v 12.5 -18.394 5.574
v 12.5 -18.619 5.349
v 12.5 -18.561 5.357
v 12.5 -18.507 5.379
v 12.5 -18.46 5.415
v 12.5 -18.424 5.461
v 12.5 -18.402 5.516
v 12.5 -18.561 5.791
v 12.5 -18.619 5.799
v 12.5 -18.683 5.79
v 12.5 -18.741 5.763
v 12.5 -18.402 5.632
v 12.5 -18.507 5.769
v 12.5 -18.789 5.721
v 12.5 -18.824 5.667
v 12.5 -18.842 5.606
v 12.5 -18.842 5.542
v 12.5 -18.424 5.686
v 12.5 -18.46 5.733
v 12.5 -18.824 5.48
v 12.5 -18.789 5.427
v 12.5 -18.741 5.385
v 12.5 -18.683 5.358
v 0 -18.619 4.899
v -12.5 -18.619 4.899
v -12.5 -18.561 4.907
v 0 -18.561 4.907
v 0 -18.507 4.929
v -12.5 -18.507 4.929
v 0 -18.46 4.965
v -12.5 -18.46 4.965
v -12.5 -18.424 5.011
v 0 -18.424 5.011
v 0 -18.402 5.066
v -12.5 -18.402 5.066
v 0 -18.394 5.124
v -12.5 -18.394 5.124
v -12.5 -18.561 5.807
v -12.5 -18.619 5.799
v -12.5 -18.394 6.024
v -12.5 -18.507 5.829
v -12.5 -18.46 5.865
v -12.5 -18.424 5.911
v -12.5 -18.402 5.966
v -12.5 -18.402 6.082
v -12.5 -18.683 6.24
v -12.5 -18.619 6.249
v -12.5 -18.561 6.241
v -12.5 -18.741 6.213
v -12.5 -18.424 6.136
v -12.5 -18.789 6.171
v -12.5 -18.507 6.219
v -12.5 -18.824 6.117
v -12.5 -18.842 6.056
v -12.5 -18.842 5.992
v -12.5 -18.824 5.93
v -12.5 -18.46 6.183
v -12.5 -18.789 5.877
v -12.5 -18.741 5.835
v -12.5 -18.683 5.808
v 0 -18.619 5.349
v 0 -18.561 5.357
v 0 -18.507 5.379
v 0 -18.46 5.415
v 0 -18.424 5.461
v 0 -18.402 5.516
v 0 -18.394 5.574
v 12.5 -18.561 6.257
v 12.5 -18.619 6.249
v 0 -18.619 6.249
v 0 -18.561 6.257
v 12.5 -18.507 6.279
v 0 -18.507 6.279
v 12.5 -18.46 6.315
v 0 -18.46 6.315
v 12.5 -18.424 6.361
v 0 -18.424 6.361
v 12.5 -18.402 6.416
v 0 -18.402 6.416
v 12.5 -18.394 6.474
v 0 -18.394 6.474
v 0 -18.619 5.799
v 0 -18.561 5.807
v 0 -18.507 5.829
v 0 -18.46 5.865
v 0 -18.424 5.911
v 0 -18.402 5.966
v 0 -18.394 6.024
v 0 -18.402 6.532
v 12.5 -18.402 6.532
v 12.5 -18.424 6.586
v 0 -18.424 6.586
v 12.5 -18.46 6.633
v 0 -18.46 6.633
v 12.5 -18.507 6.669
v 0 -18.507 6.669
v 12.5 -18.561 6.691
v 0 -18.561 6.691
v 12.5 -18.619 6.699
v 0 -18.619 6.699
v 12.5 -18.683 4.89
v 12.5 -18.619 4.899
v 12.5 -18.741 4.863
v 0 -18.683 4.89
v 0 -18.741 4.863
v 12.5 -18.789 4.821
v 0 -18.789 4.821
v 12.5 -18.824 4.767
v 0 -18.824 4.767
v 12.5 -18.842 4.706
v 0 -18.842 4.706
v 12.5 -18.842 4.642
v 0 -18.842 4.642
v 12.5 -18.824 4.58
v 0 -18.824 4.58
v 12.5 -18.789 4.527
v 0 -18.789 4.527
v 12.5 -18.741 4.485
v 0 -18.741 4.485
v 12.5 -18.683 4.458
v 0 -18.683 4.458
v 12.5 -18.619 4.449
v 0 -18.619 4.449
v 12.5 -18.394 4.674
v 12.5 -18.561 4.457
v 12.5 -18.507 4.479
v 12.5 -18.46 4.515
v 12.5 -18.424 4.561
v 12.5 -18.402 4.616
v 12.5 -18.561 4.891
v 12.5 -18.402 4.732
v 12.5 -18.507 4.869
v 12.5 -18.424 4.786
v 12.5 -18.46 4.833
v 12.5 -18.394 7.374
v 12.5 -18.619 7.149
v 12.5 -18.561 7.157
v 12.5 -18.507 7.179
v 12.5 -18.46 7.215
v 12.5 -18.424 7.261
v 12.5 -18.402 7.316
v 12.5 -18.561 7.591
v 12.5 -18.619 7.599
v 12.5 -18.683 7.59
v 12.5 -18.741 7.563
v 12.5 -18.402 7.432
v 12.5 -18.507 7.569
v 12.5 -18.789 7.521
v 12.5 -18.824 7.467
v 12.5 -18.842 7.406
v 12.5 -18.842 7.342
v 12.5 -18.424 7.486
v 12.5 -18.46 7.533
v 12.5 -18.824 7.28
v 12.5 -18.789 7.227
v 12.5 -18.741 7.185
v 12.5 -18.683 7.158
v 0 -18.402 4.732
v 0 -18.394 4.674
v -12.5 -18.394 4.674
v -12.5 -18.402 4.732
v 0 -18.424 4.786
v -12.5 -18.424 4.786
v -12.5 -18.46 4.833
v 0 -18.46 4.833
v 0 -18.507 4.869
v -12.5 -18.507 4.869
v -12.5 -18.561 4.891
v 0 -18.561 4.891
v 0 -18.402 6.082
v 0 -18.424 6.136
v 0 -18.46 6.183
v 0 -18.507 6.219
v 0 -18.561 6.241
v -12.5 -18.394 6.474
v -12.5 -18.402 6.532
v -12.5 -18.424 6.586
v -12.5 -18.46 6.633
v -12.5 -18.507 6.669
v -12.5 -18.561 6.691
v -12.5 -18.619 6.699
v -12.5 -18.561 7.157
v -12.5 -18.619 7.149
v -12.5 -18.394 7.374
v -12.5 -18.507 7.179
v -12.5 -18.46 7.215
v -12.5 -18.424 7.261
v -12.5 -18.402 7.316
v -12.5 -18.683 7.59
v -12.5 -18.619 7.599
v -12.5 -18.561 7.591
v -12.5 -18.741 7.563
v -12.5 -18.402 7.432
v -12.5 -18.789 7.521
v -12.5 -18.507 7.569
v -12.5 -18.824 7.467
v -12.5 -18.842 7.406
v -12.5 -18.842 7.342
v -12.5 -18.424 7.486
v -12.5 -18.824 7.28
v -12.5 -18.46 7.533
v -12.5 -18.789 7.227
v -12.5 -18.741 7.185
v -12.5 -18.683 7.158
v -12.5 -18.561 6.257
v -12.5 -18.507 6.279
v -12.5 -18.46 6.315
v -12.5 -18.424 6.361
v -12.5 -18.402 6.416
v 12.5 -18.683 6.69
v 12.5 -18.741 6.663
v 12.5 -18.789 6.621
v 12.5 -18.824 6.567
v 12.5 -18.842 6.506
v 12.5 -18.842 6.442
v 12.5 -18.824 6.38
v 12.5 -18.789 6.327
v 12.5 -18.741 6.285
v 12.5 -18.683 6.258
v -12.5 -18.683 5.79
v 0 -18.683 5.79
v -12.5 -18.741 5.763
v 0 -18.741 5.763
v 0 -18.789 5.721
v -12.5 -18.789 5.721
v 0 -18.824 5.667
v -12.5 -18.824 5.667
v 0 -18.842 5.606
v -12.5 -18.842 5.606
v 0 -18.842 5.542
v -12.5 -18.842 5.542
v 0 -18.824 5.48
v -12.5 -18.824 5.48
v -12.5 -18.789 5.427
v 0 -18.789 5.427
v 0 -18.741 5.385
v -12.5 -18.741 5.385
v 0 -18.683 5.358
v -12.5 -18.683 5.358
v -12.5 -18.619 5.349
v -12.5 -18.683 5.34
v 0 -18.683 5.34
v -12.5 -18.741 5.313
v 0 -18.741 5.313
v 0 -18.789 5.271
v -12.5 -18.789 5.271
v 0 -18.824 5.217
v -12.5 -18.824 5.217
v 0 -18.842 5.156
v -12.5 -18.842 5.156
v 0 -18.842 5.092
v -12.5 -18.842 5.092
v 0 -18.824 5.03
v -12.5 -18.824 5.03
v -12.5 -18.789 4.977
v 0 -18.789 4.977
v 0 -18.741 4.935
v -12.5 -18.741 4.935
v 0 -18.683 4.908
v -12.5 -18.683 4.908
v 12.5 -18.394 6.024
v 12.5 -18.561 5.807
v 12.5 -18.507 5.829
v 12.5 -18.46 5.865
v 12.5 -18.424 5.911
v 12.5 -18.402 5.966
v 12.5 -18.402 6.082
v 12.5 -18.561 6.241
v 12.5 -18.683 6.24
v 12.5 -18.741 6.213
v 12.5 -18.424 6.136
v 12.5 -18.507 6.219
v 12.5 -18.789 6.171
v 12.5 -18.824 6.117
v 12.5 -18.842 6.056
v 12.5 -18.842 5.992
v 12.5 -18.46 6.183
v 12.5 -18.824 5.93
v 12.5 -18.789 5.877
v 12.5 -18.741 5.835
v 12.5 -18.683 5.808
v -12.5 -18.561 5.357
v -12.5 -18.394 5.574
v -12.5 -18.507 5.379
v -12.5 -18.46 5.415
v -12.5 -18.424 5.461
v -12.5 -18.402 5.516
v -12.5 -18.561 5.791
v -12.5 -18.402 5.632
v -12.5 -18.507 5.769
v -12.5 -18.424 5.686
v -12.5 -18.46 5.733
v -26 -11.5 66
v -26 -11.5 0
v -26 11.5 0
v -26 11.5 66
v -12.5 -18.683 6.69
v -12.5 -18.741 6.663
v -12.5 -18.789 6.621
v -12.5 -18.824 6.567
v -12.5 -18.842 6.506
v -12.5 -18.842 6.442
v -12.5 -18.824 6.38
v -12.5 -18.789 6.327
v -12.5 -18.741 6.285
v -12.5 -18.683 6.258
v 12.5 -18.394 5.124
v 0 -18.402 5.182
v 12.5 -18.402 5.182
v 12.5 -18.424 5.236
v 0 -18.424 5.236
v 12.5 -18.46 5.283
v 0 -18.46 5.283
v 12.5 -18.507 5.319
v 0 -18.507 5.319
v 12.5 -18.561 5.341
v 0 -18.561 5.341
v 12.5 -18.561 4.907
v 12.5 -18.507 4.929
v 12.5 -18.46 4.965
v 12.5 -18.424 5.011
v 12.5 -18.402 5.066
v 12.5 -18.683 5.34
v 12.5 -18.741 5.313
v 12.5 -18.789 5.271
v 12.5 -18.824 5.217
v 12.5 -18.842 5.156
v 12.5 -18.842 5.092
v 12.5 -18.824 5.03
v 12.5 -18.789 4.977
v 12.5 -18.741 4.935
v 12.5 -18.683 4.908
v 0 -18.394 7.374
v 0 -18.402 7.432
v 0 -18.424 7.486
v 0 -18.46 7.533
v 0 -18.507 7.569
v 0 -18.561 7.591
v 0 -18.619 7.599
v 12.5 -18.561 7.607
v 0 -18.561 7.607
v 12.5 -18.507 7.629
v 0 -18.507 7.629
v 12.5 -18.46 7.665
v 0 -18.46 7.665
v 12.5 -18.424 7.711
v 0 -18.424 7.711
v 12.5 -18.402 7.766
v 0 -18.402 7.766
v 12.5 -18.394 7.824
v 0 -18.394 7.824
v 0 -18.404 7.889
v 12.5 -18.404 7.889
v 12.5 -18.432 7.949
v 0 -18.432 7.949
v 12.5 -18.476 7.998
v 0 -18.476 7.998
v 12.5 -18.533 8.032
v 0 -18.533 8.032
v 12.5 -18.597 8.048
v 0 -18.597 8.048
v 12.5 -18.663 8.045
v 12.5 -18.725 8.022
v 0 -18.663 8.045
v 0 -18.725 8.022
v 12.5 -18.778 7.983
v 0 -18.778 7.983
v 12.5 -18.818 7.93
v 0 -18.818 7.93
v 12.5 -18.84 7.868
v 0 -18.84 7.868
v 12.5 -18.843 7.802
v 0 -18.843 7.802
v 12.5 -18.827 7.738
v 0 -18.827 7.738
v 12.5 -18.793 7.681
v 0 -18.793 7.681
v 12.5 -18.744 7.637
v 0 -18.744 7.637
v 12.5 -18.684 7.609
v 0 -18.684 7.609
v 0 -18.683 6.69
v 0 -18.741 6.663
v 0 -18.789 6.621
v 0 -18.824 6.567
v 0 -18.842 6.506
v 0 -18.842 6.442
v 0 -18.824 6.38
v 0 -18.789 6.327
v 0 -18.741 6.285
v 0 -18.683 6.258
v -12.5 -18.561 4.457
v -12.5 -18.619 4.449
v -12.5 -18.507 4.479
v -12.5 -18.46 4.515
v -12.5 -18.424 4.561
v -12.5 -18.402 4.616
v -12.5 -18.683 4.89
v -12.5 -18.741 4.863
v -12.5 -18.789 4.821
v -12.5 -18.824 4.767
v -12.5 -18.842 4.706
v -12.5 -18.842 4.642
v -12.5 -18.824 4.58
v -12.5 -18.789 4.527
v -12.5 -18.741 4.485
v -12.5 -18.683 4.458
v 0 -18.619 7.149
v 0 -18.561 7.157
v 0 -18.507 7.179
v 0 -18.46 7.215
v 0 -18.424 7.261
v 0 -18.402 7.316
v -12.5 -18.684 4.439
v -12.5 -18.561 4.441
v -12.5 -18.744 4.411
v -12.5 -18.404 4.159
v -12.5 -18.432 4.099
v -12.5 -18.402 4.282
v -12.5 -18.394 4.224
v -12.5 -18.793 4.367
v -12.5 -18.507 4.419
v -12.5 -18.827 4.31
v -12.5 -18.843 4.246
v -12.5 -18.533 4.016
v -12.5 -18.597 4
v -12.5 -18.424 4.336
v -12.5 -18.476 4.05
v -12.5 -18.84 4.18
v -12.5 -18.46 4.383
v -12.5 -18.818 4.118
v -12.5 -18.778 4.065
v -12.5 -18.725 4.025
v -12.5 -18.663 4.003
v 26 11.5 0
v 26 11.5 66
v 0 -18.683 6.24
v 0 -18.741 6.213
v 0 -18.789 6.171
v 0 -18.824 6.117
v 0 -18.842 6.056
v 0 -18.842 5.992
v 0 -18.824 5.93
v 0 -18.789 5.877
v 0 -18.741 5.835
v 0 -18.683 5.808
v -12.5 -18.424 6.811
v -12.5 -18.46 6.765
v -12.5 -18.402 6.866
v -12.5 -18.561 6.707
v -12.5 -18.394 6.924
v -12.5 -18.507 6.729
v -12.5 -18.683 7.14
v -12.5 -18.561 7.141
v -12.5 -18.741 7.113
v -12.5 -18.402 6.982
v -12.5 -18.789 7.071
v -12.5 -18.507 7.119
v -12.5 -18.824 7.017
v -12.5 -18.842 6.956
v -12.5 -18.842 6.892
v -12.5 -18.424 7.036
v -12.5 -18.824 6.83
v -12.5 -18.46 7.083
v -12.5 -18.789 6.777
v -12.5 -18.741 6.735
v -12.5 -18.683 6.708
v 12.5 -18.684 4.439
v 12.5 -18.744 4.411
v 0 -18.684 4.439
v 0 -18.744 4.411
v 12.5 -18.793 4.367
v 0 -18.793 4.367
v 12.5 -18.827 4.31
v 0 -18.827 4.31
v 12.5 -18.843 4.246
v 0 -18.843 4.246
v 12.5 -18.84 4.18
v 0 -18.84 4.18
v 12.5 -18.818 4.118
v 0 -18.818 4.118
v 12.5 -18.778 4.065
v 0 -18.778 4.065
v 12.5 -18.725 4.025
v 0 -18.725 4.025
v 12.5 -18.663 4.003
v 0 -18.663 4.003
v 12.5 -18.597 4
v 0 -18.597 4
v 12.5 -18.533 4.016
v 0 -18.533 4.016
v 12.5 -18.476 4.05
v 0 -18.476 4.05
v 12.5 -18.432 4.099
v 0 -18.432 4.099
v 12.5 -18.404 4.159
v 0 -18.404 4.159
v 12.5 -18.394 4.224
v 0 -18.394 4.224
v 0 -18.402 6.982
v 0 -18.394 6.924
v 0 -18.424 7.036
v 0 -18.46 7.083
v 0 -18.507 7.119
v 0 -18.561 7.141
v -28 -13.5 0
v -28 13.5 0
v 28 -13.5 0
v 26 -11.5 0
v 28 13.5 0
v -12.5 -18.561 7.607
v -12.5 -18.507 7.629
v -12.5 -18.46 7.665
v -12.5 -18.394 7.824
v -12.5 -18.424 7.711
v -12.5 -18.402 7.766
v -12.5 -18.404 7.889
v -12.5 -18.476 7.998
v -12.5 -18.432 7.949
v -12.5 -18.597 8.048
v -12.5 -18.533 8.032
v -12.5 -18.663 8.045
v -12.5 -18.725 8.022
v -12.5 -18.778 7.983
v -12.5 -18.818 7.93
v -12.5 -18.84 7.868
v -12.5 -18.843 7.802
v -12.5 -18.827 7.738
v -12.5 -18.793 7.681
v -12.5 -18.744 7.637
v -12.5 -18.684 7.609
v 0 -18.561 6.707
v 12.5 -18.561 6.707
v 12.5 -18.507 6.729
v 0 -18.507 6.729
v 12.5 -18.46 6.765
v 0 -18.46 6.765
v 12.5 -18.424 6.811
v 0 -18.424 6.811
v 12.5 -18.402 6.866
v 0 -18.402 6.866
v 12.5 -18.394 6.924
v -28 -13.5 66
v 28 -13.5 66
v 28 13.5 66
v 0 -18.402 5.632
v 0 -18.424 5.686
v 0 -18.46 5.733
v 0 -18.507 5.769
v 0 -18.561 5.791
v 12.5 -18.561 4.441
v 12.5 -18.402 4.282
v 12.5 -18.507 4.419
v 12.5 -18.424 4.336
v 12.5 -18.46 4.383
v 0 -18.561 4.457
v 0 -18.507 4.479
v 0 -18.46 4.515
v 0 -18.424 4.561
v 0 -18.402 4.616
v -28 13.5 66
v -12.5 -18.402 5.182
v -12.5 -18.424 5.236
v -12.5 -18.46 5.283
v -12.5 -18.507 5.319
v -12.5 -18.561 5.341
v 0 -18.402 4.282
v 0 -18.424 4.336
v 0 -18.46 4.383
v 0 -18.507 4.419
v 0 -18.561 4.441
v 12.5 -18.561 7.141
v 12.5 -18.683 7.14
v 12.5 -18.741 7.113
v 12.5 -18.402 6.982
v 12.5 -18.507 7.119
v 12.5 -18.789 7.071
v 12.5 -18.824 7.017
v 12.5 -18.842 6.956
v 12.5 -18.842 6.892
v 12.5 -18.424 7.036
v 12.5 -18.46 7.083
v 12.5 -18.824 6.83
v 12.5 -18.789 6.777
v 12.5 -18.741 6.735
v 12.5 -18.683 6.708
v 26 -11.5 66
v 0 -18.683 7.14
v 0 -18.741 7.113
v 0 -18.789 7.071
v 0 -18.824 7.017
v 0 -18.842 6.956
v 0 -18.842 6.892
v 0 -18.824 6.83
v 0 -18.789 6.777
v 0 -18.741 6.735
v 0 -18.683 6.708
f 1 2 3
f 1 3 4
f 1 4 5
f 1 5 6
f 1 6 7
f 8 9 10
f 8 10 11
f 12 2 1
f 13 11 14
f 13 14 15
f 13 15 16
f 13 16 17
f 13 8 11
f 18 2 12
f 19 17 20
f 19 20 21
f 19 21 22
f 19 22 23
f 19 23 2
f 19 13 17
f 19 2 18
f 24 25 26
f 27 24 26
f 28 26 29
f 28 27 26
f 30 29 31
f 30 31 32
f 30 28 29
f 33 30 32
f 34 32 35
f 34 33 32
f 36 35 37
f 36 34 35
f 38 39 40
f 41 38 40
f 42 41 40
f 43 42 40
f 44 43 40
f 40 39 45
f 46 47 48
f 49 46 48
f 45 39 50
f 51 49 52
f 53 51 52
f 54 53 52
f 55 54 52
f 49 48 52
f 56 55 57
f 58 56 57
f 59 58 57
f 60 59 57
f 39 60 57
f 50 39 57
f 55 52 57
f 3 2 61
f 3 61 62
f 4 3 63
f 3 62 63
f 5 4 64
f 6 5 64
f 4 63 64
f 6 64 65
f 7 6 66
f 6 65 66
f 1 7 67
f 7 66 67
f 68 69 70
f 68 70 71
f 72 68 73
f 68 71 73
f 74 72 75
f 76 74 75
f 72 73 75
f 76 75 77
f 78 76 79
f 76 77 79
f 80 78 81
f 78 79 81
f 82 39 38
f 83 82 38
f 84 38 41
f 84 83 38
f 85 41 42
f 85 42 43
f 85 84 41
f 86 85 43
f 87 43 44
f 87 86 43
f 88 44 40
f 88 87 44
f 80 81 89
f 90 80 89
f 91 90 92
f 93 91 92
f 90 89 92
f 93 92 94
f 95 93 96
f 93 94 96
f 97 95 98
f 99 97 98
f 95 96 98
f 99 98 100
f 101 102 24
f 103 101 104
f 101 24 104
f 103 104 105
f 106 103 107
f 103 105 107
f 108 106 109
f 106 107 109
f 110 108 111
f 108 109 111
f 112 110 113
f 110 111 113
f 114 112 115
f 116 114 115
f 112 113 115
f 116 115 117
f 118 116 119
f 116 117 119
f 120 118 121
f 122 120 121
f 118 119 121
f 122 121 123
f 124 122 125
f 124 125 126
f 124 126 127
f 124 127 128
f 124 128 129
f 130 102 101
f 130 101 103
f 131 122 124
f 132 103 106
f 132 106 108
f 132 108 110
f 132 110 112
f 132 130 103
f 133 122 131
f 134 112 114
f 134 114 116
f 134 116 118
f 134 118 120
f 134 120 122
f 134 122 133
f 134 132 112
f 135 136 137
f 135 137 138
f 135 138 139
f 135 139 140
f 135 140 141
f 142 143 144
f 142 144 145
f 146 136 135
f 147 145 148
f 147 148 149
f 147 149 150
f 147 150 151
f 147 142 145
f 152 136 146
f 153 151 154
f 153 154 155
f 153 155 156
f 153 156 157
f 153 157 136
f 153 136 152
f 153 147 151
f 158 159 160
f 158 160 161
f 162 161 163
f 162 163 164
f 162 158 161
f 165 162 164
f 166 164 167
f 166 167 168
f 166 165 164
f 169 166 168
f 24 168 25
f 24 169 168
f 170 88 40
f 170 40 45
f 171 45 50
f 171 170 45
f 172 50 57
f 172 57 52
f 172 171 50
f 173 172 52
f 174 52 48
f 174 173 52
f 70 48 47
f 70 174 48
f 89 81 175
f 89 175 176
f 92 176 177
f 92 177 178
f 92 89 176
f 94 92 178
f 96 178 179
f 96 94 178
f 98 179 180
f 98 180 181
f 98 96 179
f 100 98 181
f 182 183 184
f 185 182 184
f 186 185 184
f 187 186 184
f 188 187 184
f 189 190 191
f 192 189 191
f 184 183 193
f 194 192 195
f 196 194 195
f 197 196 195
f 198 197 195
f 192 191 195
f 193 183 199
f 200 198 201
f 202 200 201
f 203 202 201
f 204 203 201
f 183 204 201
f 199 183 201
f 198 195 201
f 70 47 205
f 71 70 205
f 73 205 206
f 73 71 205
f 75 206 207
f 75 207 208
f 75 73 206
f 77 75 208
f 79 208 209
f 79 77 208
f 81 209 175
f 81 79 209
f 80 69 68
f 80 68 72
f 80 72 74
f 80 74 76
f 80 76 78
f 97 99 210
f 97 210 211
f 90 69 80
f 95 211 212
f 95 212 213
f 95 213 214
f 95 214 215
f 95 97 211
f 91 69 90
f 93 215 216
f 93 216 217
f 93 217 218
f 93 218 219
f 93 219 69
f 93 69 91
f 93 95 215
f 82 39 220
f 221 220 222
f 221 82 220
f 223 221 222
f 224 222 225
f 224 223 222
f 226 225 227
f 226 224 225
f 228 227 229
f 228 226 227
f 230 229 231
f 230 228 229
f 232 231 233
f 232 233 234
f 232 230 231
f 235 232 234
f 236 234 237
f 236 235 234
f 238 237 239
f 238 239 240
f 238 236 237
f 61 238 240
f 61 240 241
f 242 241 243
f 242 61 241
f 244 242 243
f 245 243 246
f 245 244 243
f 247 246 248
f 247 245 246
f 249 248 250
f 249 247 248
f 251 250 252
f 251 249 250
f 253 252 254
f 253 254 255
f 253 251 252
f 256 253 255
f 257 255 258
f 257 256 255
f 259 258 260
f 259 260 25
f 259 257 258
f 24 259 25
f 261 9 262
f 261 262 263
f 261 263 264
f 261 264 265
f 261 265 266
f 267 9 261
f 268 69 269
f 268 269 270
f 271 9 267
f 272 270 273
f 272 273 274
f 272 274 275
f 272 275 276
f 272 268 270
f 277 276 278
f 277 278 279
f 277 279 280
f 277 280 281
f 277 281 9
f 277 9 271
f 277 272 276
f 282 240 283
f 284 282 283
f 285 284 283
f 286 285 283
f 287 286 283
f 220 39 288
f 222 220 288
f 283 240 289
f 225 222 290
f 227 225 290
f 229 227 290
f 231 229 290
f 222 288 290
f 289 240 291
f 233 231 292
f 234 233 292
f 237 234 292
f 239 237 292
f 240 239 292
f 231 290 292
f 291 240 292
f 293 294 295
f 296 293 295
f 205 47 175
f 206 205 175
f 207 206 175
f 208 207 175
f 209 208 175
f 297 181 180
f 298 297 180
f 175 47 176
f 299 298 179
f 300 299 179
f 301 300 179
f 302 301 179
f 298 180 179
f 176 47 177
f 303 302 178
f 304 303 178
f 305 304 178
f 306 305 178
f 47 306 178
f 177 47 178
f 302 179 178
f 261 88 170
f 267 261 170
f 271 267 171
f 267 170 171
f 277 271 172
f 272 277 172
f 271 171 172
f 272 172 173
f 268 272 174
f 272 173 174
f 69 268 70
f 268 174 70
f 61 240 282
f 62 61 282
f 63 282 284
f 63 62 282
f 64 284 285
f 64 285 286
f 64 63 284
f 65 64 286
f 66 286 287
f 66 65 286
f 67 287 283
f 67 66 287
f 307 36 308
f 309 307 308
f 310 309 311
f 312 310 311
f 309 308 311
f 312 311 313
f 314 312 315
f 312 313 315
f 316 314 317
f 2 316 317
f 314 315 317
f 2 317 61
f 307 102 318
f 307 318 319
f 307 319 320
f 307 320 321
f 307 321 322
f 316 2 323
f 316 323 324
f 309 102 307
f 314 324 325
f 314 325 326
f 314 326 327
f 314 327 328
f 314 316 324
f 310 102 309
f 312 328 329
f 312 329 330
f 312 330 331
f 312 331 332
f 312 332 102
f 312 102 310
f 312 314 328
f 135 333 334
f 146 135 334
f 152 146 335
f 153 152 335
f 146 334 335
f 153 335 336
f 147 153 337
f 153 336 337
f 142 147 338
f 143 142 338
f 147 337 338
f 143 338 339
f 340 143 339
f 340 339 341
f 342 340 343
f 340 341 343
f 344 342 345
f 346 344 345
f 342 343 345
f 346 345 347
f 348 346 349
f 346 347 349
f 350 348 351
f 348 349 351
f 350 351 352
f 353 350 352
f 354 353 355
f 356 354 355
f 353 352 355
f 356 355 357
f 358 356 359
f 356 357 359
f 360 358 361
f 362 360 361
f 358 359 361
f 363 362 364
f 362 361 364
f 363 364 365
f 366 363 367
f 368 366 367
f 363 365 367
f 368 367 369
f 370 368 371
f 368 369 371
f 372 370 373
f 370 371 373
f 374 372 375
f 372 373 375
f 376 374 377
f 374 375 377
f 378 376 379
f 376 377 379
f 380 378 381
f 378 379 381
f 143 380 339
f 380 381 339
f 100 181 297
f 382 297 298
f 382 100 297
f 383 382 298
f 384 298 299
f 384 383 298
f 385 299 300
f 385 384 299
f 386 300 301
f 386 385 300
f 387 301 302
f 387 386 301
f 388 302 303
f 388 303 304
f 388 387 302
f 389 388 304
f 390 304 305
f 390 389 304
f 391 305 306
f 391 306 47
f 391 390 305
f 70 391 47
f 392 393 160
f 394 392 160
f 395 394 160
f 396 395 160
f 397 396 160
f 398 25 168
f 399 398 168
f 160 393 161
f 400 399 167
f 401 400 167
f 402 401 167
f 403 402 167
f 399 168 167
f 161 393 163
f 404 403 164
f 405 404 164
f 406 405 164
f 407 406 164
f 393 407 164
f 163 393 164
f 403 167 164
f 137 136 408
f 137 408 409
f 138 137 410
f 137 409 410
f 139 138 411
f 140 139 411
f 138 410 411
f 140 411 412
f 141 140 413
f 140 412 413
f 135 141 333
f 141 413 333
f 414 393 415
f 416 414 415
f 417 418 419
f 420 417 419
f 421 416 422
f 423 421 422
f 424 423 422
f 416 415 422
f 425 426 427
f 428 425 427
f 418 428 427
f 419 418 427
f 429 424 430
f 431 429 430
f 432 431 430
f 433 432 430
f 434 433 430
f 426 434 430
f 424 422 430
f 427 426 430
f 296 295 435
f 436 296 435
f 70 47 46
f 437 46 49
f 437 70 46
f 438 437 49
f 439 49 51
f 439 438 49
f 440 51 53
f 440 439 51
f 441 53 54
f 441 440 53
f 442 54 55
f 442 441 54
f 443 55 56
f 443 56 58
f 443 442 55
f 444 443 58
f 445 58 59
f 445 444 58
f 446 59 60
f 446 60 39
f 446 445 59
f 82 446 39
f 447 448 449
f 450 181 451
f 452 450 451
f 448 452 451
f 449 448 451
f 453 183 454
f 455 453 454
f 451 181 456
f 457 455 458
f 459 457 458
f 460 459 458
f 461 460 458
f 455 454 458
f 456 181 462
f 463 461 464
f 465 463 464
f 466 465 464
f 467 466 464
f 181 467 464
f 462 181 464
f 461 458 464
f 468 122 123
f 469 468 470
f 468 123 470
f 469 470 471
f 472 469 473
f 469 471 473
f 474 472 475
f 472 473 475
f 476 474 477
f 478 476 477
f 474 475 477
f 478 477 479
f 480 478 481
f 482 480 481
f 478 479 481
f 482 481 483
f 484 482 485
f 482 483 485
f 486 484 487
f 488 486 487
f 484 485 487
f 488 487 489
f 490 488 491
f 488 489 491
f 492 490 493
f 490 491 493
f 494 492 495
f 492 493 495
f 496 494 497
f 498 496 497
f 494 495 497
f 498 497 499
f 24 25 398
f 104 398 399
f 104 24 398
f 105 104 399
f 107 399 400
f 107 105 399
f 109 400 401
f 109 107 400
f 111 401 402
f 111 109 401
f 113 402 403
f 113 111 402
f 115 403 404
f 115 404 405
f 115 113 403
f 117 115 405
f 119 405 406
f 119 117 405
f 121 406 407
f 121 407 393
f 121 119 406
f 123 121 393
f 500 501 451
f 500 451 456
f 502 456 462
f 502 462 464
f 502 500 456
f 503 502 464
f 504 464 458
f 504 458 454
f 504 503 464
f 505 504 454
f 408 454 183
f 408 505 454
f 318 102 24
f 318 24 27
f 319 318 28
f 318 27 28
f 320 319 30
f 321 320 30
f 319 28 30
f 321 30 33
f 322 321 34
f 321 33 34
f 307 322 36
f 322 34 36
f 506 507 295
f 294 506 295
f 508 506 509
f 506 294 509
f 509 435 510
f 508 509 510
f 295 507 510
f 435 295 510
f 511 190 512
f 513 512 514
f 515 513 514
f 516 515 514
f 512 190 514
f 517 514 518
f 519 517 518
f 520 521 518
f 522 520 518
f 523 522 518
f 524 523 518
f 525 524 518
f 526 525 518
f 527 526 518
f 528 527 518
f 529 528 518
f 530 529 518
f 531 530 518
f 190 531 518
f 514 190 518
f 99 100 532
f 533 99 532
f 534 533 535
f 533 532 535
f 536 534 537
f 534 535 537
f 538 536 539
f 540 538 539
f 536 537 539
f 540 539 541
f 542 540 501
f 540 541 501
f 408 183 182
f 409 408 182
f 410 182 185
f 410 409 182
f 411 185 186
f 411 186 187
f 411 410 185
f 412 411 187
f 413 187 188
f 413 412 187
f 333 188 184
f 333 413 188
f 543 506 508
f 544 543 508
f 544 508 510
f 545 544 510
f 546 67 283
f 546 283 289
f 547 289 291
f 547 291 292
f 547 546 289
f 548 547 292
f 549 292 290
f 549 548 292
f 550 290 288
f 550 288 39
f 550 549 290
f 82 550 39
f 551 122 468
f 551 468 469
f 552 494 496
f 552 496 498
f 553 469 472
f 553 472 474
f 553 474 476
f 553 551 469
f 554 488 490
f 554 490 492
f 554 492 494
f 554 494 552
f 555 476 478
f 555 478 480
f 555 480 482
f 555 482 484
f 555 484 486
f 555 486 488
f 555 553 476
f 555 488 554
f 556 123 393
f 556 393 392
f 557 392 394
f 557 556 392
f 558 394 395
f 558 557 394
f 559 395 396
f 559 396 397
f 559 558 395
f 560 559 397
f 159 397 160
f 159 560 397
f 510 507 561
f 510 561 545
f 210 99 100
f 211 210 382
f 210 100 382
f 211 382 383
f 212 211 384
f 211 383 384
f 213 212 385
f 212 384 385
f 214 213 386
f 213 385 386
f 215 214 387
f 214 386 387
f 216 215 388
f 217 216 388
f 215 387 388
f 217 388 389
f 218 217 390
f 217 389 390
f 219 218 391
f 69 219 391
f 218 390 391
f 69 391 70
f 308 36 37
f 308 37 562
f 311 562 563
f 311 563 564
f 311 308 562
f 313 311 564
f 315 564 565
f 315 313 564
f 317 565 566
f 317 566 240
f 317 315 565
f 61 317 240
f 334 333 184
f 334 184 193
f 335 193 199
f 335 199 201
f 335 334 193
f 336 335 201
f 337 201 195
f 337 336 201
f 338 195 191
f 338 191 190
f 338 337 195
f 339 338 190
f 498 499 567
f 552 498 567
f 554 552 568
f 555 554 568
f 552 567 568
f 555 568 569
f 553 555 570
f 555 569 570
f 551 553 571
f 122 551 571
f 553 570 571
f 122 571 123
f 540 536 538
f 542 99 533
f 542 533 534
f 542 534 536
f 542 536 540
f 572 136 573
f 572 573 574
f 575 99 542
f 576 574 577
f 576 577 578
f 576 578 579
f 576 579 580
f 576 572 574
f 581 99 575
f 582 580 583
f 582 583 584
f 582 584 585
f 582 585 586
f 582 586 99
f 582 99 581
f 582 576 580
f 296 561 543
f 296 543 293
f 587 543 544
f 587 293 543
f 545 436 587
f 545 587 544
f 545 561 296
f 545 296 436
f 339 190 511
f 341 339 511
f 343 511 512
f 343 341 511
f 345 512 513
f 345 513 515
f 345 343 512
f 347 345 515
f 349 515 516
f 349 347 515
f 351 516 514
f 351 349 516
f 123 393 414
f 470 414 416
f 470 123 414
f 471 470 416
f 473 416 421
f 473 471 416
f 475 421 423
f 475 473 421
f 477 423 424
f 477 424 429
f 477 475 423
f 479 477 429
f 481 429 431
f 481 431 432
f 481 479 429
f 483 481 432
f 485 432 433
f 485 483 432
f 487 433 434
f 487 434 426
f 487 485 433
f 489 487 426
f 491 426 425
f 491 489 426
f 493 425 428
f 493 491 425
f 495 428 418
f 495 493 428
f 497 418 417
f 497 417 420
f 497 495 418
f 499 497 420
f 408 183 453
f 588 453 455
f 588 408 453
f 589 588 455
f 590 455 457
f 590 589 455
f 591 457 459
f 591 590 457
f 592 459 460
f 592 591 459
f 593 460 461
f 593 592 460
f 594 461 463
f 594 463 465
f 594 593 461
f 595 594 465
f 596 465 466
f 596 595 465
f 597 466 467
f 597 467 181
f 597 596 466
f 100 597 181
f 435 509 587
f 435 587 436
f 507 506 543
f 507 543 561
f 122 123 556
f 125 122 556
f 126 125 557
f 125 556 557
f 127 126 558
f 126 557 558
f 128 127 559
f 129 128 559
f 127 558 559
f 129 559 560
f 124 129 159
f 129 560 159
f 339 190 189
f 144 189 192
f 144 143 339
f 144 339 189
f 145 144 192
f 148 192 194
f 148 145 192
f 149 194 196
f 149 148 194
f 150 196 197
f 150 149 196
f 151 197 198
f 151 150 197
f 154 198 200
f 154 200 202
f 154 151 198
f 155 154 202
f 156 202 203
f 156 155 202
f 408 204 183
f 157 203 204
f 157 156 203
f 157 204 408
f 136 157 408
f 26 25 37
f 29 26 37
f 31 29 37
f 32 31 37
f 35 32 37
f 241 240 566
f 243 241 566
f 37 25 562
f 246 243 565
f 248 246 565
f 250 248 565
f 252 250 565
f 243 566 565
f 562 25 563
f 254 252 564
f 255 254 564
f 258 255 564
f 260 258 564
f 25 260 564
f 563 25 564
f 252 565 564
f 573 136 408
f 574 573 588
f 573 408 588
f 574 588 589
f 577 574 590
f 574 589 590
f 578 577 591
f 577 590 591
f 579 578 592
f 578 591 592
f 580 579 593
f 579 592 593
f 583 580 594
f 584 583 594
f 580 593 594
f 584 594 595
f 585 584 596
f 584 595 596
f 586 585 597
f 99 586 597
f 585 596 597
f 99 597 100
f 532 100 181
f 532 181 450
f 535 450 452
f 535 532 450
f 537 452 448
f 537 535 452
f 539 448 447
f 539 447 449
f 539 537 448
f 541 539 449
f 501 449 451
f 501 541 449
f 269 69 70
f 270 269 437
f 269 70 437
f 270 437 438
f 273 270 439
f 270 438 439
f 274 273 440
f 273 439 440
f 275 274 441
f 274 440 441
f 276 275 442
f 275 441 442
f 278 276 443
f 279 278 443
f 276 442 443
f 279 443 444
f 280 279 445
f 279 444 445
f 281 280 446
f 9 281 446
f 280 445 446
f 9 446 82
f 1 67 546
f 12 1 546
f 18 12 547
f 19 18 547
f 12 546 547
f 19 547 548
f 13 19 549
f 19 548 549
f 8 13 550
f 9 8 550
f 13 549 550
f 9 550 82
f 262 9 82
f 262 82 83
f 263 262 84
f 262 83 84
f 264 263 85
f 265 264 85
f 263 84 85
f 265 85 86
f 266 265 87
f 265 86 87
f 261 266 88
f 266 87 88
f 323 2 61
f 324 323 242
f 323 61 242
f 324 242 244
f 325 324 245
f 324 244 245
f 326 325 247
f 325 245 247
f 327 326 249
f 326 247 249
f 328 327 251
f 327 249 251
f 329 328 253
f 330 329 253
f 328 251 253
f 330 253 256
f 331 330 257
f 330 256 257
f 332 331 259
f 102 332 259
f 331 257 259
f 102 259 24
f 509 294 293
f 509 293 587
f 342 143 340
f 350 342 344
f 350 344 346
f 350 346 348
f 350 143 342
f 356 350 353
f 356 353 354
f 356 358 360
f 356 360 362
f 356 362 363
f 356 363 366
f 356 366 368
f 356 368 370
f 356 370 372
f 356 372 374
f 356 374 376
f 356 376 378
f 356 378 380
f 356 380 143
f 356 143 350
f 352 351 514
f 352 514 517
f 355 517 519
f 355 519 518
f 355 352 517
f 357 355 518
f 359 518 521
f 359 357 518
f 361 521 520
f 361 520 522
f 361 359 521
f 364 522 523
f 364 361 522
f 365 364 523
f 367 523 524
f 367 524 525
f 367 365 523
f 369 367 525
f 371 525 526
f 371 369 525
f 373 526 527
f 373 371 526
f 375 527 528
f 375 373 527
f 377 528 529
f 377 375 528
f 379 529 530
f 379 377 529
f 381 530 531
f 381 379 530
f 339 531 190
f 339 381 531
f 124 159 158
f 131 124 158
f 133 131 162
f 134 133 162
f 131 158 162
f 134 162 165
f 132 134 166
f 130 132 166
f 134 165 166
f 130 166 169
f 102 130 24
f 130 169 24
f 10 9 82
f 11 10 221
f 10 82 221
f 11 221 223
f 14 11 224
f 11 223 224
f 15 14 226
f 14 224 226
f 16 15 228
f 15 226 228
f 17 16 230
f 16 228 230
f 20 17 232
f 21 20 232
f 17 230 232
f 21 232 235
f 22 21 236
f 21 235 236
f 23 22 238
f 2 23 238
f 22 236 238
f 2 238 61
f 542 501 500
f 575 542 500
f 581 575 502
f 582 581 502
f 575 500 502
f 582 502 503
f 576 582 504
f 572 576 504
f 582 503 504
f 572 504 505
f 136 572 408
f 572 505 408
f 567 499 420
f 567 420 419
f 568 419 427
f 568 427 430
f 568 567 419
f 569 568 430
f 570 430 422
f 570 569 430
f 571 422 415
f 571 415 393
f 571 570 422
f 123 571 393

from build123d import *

# Parameters (mm, degrees)
F0_W     = 56
F0_H     = 27
F0_W_2   = 52
F0_H_2   = 23
F1_DEPTH = 66
F3_DEPTH = 12.5


with BuildPart() as f1:
    # F0 (on Top) → F1 (new body)
    with BuildSketch(Plane.XY):
        Rectangle(F0_W, F0_H)
        Rectangle(F0_W_2, F0_H_2, mode=Mode.SUBTRACT)
    extrude(amount=F1_DEPTH)


with BuildPart() as f3:
    # F2 (on Right) → F3 (new body, symmetric)
    with BuildSketch(Plane.YZ):
        with BuildLine():
            ThreePointArc((-18.394120121, 4.22389699), (-18.4600210952, 4.3829960157), (-18.619120121, 4.44889699))
            ThreePointArc((-18.619120121, 4.44889699), (-18.7782191468, 4.0647979642), (-18.394120121, 4.22389699))
        make_face()
    extrude(amount=F3_DEPTH, both=True)


with BuildPart() as f3b:
    # F2 (on Right) → F3, piece 2 (new body, symmetric)
    with BuildSketch(Plane.YZ):
        with BuildLine():
            ThreePointArc((-18.394120121, 4.67389699), (-18.4600210952, 4.8329960157), (-18.619120121, 4.89889699))
            ThreePointArc((-18.619120121, 4.89889699), (-18.844120121, 4.67389699), (-18.619120121, 4.44889699))
            ThreePointArc((-18.619120121, 4.44889699), (-18.4600210952, 4.5147979642), (-18.394120121, 4.67389699))
        make_face()
    extrude(amount=F3_DEPTH, both=True)


with BuildPart() as f3c:
    # F2 (on Right) → F3, piece 3 (new body, symmetric)
    with BuildSketch(Plane.YZ):
        with BuildLine():
            ThreePointArc((-18.394120121, 5.57389699), (-18.4600210952, 5.7329960157), (-18.619120121, 5.79889699))
            ThreePointArc((-18.619120121, 5.79889699), (-18.844120121, 5.57389699), (-18.619120121, 5.34889699))
            ThreePointArc((-18.619120121, 5.34889699), (-18.4600210952, 5.4147979642), (-18.394120121, 5.57389699))
        make_face()
    extrude(amount=F3_DEPTH, both=True)


with BuildPart() as f3d:
    # F2 (on Right) → F3, piece 4 (new body, symmetric)
    with BuildSketch(Plane.YZ):
        with BuildLine():
            ThreePointArc((-18.394120121, 5.12389699), (-18.4600210952, 5.2829960157), (-18.619120121, 5.34889699))
            ThreePointArc((-18.619120121, 5.34889699), (-18.844120121, 5.12389699), (-18.619120121, 4.89889699))
            ThreePointArc((-18.619120121, 4.89889699), (-18.4600210952, 4.9647979642), (-18.394120121, 5.12389699))
        make_face()
    extrude(amount=F3_DEPTH, both=True)


with BuildPart() as f3e:
    # F2 (on Right) → F3, piece 5 (new body, symmetric)
    with BuildSketch(Plane.YZ):
        with BuildLine():
            ThreePointArc((-18.394120121, 6.02389699), (-18.4600210952, 6.1829960157), (-18.619120121, 6.24889699))
            ThreePointArc((-18.619120121, 6.24889699), (-18.844120121, 6.02389699), (-18.619120121, 5.79889699))
            ThreePointArc((-18.619120121, 5.79889699), (-18.4600210952, 5.8647979642), (-18.394120121, 6.02389699))
        make_face()
    extrude(amount=F3_DEPTH, both=True)


with BuildPart() as f3f:
    # F2 (on Right) → F3, piece 6 (new body, symmetric)
    with BuildSketch(Plane.YZ):
        with BuildLine():
            ThreePointArc((-18.394120121, 6.47389699), (-18.4600210952, 6.6329960157), (-18.619120121, 6.69889699))
            ThreePointArc((-18.619120121, 6.69889699), (-18.844120121, 6.47389699), (-18.619120121, 6.24889699))
            ThreePointArc((-18.619120121, 6.24889699), (-18.4600210952, 6.3147979642), (-18.394120121, 6.47389699))
        make_face()
    extrude(amount=F3_DEPTH, both=True)


with BuildPart() as f3g:
    # F2 (on Right) → F3, piece 7 (new body, symmetric)
    with BuildSketch(Plane.YZ):
        with BuildLine():
            ThreePointArc((-18.619120121, 6.69889699), (-18.4600210952, 6.7647979642), (-18.394120121, 6.92389699))
            ThreePointArc((-18.394120121, 6.92389699), (-18.4600210952, 7.0829960157), (-18.619120121, 7.14889699))
            ThreePointArc((-18.619120121, 7.14889699), (-18.844120121, 6.92389699), (-18.619120121, 6.69889699))
        make_face()
    extrude(amount=F3_DEPTH, both=True)


with BuildPart() as f3h:
    # F2 (on Right) → F3, piece 8 (new body, symmetric)
    with BuildSketch(Plane.YZ):
        with BuildLine():
            ThreePointArc((-18.619120121, 7.59889699), (-18.844120121, 7.37389699), (-18.619120121, 7.14889699))
            ThreePointArc((-18.619120121, 7.14889699), (-18.4600210952, 7.2147979642), (-18.394120121, 7.37389699))
            ThreePointArc((-18.394120121, 7.37389699), (-18.4600210952, 7.5329960157), (-18.619120121, 7.59889699))
        make_face()
    extrude(amount=F3_DEPTH, both=True)


with BuildPart() as f3i:
    # F2 (on Right) → F3, piece 9 (new body, symmetric)
    with BuildSketch(Plane.YZ):
        with BuildLine():
            ThreePointArc((-18.394120121, 7.82389699), (-18.7782191468, 7.9829960157), (-18.619120121, 7.59889699))
            ThreePointArc((-18.619120121, 7.59889699), (-18.4600210952, 7.6647979642), (-18.394120121, 7.82389699))
        make_face()
    extrude(amount=F3_DEPTH, both=True)


solid = Compound([f1.part, f3.part, f3b.part, f3c.part, f3d.part, f3e.part, f3f.part, f3g.part, f3h.part, f3i.part])
